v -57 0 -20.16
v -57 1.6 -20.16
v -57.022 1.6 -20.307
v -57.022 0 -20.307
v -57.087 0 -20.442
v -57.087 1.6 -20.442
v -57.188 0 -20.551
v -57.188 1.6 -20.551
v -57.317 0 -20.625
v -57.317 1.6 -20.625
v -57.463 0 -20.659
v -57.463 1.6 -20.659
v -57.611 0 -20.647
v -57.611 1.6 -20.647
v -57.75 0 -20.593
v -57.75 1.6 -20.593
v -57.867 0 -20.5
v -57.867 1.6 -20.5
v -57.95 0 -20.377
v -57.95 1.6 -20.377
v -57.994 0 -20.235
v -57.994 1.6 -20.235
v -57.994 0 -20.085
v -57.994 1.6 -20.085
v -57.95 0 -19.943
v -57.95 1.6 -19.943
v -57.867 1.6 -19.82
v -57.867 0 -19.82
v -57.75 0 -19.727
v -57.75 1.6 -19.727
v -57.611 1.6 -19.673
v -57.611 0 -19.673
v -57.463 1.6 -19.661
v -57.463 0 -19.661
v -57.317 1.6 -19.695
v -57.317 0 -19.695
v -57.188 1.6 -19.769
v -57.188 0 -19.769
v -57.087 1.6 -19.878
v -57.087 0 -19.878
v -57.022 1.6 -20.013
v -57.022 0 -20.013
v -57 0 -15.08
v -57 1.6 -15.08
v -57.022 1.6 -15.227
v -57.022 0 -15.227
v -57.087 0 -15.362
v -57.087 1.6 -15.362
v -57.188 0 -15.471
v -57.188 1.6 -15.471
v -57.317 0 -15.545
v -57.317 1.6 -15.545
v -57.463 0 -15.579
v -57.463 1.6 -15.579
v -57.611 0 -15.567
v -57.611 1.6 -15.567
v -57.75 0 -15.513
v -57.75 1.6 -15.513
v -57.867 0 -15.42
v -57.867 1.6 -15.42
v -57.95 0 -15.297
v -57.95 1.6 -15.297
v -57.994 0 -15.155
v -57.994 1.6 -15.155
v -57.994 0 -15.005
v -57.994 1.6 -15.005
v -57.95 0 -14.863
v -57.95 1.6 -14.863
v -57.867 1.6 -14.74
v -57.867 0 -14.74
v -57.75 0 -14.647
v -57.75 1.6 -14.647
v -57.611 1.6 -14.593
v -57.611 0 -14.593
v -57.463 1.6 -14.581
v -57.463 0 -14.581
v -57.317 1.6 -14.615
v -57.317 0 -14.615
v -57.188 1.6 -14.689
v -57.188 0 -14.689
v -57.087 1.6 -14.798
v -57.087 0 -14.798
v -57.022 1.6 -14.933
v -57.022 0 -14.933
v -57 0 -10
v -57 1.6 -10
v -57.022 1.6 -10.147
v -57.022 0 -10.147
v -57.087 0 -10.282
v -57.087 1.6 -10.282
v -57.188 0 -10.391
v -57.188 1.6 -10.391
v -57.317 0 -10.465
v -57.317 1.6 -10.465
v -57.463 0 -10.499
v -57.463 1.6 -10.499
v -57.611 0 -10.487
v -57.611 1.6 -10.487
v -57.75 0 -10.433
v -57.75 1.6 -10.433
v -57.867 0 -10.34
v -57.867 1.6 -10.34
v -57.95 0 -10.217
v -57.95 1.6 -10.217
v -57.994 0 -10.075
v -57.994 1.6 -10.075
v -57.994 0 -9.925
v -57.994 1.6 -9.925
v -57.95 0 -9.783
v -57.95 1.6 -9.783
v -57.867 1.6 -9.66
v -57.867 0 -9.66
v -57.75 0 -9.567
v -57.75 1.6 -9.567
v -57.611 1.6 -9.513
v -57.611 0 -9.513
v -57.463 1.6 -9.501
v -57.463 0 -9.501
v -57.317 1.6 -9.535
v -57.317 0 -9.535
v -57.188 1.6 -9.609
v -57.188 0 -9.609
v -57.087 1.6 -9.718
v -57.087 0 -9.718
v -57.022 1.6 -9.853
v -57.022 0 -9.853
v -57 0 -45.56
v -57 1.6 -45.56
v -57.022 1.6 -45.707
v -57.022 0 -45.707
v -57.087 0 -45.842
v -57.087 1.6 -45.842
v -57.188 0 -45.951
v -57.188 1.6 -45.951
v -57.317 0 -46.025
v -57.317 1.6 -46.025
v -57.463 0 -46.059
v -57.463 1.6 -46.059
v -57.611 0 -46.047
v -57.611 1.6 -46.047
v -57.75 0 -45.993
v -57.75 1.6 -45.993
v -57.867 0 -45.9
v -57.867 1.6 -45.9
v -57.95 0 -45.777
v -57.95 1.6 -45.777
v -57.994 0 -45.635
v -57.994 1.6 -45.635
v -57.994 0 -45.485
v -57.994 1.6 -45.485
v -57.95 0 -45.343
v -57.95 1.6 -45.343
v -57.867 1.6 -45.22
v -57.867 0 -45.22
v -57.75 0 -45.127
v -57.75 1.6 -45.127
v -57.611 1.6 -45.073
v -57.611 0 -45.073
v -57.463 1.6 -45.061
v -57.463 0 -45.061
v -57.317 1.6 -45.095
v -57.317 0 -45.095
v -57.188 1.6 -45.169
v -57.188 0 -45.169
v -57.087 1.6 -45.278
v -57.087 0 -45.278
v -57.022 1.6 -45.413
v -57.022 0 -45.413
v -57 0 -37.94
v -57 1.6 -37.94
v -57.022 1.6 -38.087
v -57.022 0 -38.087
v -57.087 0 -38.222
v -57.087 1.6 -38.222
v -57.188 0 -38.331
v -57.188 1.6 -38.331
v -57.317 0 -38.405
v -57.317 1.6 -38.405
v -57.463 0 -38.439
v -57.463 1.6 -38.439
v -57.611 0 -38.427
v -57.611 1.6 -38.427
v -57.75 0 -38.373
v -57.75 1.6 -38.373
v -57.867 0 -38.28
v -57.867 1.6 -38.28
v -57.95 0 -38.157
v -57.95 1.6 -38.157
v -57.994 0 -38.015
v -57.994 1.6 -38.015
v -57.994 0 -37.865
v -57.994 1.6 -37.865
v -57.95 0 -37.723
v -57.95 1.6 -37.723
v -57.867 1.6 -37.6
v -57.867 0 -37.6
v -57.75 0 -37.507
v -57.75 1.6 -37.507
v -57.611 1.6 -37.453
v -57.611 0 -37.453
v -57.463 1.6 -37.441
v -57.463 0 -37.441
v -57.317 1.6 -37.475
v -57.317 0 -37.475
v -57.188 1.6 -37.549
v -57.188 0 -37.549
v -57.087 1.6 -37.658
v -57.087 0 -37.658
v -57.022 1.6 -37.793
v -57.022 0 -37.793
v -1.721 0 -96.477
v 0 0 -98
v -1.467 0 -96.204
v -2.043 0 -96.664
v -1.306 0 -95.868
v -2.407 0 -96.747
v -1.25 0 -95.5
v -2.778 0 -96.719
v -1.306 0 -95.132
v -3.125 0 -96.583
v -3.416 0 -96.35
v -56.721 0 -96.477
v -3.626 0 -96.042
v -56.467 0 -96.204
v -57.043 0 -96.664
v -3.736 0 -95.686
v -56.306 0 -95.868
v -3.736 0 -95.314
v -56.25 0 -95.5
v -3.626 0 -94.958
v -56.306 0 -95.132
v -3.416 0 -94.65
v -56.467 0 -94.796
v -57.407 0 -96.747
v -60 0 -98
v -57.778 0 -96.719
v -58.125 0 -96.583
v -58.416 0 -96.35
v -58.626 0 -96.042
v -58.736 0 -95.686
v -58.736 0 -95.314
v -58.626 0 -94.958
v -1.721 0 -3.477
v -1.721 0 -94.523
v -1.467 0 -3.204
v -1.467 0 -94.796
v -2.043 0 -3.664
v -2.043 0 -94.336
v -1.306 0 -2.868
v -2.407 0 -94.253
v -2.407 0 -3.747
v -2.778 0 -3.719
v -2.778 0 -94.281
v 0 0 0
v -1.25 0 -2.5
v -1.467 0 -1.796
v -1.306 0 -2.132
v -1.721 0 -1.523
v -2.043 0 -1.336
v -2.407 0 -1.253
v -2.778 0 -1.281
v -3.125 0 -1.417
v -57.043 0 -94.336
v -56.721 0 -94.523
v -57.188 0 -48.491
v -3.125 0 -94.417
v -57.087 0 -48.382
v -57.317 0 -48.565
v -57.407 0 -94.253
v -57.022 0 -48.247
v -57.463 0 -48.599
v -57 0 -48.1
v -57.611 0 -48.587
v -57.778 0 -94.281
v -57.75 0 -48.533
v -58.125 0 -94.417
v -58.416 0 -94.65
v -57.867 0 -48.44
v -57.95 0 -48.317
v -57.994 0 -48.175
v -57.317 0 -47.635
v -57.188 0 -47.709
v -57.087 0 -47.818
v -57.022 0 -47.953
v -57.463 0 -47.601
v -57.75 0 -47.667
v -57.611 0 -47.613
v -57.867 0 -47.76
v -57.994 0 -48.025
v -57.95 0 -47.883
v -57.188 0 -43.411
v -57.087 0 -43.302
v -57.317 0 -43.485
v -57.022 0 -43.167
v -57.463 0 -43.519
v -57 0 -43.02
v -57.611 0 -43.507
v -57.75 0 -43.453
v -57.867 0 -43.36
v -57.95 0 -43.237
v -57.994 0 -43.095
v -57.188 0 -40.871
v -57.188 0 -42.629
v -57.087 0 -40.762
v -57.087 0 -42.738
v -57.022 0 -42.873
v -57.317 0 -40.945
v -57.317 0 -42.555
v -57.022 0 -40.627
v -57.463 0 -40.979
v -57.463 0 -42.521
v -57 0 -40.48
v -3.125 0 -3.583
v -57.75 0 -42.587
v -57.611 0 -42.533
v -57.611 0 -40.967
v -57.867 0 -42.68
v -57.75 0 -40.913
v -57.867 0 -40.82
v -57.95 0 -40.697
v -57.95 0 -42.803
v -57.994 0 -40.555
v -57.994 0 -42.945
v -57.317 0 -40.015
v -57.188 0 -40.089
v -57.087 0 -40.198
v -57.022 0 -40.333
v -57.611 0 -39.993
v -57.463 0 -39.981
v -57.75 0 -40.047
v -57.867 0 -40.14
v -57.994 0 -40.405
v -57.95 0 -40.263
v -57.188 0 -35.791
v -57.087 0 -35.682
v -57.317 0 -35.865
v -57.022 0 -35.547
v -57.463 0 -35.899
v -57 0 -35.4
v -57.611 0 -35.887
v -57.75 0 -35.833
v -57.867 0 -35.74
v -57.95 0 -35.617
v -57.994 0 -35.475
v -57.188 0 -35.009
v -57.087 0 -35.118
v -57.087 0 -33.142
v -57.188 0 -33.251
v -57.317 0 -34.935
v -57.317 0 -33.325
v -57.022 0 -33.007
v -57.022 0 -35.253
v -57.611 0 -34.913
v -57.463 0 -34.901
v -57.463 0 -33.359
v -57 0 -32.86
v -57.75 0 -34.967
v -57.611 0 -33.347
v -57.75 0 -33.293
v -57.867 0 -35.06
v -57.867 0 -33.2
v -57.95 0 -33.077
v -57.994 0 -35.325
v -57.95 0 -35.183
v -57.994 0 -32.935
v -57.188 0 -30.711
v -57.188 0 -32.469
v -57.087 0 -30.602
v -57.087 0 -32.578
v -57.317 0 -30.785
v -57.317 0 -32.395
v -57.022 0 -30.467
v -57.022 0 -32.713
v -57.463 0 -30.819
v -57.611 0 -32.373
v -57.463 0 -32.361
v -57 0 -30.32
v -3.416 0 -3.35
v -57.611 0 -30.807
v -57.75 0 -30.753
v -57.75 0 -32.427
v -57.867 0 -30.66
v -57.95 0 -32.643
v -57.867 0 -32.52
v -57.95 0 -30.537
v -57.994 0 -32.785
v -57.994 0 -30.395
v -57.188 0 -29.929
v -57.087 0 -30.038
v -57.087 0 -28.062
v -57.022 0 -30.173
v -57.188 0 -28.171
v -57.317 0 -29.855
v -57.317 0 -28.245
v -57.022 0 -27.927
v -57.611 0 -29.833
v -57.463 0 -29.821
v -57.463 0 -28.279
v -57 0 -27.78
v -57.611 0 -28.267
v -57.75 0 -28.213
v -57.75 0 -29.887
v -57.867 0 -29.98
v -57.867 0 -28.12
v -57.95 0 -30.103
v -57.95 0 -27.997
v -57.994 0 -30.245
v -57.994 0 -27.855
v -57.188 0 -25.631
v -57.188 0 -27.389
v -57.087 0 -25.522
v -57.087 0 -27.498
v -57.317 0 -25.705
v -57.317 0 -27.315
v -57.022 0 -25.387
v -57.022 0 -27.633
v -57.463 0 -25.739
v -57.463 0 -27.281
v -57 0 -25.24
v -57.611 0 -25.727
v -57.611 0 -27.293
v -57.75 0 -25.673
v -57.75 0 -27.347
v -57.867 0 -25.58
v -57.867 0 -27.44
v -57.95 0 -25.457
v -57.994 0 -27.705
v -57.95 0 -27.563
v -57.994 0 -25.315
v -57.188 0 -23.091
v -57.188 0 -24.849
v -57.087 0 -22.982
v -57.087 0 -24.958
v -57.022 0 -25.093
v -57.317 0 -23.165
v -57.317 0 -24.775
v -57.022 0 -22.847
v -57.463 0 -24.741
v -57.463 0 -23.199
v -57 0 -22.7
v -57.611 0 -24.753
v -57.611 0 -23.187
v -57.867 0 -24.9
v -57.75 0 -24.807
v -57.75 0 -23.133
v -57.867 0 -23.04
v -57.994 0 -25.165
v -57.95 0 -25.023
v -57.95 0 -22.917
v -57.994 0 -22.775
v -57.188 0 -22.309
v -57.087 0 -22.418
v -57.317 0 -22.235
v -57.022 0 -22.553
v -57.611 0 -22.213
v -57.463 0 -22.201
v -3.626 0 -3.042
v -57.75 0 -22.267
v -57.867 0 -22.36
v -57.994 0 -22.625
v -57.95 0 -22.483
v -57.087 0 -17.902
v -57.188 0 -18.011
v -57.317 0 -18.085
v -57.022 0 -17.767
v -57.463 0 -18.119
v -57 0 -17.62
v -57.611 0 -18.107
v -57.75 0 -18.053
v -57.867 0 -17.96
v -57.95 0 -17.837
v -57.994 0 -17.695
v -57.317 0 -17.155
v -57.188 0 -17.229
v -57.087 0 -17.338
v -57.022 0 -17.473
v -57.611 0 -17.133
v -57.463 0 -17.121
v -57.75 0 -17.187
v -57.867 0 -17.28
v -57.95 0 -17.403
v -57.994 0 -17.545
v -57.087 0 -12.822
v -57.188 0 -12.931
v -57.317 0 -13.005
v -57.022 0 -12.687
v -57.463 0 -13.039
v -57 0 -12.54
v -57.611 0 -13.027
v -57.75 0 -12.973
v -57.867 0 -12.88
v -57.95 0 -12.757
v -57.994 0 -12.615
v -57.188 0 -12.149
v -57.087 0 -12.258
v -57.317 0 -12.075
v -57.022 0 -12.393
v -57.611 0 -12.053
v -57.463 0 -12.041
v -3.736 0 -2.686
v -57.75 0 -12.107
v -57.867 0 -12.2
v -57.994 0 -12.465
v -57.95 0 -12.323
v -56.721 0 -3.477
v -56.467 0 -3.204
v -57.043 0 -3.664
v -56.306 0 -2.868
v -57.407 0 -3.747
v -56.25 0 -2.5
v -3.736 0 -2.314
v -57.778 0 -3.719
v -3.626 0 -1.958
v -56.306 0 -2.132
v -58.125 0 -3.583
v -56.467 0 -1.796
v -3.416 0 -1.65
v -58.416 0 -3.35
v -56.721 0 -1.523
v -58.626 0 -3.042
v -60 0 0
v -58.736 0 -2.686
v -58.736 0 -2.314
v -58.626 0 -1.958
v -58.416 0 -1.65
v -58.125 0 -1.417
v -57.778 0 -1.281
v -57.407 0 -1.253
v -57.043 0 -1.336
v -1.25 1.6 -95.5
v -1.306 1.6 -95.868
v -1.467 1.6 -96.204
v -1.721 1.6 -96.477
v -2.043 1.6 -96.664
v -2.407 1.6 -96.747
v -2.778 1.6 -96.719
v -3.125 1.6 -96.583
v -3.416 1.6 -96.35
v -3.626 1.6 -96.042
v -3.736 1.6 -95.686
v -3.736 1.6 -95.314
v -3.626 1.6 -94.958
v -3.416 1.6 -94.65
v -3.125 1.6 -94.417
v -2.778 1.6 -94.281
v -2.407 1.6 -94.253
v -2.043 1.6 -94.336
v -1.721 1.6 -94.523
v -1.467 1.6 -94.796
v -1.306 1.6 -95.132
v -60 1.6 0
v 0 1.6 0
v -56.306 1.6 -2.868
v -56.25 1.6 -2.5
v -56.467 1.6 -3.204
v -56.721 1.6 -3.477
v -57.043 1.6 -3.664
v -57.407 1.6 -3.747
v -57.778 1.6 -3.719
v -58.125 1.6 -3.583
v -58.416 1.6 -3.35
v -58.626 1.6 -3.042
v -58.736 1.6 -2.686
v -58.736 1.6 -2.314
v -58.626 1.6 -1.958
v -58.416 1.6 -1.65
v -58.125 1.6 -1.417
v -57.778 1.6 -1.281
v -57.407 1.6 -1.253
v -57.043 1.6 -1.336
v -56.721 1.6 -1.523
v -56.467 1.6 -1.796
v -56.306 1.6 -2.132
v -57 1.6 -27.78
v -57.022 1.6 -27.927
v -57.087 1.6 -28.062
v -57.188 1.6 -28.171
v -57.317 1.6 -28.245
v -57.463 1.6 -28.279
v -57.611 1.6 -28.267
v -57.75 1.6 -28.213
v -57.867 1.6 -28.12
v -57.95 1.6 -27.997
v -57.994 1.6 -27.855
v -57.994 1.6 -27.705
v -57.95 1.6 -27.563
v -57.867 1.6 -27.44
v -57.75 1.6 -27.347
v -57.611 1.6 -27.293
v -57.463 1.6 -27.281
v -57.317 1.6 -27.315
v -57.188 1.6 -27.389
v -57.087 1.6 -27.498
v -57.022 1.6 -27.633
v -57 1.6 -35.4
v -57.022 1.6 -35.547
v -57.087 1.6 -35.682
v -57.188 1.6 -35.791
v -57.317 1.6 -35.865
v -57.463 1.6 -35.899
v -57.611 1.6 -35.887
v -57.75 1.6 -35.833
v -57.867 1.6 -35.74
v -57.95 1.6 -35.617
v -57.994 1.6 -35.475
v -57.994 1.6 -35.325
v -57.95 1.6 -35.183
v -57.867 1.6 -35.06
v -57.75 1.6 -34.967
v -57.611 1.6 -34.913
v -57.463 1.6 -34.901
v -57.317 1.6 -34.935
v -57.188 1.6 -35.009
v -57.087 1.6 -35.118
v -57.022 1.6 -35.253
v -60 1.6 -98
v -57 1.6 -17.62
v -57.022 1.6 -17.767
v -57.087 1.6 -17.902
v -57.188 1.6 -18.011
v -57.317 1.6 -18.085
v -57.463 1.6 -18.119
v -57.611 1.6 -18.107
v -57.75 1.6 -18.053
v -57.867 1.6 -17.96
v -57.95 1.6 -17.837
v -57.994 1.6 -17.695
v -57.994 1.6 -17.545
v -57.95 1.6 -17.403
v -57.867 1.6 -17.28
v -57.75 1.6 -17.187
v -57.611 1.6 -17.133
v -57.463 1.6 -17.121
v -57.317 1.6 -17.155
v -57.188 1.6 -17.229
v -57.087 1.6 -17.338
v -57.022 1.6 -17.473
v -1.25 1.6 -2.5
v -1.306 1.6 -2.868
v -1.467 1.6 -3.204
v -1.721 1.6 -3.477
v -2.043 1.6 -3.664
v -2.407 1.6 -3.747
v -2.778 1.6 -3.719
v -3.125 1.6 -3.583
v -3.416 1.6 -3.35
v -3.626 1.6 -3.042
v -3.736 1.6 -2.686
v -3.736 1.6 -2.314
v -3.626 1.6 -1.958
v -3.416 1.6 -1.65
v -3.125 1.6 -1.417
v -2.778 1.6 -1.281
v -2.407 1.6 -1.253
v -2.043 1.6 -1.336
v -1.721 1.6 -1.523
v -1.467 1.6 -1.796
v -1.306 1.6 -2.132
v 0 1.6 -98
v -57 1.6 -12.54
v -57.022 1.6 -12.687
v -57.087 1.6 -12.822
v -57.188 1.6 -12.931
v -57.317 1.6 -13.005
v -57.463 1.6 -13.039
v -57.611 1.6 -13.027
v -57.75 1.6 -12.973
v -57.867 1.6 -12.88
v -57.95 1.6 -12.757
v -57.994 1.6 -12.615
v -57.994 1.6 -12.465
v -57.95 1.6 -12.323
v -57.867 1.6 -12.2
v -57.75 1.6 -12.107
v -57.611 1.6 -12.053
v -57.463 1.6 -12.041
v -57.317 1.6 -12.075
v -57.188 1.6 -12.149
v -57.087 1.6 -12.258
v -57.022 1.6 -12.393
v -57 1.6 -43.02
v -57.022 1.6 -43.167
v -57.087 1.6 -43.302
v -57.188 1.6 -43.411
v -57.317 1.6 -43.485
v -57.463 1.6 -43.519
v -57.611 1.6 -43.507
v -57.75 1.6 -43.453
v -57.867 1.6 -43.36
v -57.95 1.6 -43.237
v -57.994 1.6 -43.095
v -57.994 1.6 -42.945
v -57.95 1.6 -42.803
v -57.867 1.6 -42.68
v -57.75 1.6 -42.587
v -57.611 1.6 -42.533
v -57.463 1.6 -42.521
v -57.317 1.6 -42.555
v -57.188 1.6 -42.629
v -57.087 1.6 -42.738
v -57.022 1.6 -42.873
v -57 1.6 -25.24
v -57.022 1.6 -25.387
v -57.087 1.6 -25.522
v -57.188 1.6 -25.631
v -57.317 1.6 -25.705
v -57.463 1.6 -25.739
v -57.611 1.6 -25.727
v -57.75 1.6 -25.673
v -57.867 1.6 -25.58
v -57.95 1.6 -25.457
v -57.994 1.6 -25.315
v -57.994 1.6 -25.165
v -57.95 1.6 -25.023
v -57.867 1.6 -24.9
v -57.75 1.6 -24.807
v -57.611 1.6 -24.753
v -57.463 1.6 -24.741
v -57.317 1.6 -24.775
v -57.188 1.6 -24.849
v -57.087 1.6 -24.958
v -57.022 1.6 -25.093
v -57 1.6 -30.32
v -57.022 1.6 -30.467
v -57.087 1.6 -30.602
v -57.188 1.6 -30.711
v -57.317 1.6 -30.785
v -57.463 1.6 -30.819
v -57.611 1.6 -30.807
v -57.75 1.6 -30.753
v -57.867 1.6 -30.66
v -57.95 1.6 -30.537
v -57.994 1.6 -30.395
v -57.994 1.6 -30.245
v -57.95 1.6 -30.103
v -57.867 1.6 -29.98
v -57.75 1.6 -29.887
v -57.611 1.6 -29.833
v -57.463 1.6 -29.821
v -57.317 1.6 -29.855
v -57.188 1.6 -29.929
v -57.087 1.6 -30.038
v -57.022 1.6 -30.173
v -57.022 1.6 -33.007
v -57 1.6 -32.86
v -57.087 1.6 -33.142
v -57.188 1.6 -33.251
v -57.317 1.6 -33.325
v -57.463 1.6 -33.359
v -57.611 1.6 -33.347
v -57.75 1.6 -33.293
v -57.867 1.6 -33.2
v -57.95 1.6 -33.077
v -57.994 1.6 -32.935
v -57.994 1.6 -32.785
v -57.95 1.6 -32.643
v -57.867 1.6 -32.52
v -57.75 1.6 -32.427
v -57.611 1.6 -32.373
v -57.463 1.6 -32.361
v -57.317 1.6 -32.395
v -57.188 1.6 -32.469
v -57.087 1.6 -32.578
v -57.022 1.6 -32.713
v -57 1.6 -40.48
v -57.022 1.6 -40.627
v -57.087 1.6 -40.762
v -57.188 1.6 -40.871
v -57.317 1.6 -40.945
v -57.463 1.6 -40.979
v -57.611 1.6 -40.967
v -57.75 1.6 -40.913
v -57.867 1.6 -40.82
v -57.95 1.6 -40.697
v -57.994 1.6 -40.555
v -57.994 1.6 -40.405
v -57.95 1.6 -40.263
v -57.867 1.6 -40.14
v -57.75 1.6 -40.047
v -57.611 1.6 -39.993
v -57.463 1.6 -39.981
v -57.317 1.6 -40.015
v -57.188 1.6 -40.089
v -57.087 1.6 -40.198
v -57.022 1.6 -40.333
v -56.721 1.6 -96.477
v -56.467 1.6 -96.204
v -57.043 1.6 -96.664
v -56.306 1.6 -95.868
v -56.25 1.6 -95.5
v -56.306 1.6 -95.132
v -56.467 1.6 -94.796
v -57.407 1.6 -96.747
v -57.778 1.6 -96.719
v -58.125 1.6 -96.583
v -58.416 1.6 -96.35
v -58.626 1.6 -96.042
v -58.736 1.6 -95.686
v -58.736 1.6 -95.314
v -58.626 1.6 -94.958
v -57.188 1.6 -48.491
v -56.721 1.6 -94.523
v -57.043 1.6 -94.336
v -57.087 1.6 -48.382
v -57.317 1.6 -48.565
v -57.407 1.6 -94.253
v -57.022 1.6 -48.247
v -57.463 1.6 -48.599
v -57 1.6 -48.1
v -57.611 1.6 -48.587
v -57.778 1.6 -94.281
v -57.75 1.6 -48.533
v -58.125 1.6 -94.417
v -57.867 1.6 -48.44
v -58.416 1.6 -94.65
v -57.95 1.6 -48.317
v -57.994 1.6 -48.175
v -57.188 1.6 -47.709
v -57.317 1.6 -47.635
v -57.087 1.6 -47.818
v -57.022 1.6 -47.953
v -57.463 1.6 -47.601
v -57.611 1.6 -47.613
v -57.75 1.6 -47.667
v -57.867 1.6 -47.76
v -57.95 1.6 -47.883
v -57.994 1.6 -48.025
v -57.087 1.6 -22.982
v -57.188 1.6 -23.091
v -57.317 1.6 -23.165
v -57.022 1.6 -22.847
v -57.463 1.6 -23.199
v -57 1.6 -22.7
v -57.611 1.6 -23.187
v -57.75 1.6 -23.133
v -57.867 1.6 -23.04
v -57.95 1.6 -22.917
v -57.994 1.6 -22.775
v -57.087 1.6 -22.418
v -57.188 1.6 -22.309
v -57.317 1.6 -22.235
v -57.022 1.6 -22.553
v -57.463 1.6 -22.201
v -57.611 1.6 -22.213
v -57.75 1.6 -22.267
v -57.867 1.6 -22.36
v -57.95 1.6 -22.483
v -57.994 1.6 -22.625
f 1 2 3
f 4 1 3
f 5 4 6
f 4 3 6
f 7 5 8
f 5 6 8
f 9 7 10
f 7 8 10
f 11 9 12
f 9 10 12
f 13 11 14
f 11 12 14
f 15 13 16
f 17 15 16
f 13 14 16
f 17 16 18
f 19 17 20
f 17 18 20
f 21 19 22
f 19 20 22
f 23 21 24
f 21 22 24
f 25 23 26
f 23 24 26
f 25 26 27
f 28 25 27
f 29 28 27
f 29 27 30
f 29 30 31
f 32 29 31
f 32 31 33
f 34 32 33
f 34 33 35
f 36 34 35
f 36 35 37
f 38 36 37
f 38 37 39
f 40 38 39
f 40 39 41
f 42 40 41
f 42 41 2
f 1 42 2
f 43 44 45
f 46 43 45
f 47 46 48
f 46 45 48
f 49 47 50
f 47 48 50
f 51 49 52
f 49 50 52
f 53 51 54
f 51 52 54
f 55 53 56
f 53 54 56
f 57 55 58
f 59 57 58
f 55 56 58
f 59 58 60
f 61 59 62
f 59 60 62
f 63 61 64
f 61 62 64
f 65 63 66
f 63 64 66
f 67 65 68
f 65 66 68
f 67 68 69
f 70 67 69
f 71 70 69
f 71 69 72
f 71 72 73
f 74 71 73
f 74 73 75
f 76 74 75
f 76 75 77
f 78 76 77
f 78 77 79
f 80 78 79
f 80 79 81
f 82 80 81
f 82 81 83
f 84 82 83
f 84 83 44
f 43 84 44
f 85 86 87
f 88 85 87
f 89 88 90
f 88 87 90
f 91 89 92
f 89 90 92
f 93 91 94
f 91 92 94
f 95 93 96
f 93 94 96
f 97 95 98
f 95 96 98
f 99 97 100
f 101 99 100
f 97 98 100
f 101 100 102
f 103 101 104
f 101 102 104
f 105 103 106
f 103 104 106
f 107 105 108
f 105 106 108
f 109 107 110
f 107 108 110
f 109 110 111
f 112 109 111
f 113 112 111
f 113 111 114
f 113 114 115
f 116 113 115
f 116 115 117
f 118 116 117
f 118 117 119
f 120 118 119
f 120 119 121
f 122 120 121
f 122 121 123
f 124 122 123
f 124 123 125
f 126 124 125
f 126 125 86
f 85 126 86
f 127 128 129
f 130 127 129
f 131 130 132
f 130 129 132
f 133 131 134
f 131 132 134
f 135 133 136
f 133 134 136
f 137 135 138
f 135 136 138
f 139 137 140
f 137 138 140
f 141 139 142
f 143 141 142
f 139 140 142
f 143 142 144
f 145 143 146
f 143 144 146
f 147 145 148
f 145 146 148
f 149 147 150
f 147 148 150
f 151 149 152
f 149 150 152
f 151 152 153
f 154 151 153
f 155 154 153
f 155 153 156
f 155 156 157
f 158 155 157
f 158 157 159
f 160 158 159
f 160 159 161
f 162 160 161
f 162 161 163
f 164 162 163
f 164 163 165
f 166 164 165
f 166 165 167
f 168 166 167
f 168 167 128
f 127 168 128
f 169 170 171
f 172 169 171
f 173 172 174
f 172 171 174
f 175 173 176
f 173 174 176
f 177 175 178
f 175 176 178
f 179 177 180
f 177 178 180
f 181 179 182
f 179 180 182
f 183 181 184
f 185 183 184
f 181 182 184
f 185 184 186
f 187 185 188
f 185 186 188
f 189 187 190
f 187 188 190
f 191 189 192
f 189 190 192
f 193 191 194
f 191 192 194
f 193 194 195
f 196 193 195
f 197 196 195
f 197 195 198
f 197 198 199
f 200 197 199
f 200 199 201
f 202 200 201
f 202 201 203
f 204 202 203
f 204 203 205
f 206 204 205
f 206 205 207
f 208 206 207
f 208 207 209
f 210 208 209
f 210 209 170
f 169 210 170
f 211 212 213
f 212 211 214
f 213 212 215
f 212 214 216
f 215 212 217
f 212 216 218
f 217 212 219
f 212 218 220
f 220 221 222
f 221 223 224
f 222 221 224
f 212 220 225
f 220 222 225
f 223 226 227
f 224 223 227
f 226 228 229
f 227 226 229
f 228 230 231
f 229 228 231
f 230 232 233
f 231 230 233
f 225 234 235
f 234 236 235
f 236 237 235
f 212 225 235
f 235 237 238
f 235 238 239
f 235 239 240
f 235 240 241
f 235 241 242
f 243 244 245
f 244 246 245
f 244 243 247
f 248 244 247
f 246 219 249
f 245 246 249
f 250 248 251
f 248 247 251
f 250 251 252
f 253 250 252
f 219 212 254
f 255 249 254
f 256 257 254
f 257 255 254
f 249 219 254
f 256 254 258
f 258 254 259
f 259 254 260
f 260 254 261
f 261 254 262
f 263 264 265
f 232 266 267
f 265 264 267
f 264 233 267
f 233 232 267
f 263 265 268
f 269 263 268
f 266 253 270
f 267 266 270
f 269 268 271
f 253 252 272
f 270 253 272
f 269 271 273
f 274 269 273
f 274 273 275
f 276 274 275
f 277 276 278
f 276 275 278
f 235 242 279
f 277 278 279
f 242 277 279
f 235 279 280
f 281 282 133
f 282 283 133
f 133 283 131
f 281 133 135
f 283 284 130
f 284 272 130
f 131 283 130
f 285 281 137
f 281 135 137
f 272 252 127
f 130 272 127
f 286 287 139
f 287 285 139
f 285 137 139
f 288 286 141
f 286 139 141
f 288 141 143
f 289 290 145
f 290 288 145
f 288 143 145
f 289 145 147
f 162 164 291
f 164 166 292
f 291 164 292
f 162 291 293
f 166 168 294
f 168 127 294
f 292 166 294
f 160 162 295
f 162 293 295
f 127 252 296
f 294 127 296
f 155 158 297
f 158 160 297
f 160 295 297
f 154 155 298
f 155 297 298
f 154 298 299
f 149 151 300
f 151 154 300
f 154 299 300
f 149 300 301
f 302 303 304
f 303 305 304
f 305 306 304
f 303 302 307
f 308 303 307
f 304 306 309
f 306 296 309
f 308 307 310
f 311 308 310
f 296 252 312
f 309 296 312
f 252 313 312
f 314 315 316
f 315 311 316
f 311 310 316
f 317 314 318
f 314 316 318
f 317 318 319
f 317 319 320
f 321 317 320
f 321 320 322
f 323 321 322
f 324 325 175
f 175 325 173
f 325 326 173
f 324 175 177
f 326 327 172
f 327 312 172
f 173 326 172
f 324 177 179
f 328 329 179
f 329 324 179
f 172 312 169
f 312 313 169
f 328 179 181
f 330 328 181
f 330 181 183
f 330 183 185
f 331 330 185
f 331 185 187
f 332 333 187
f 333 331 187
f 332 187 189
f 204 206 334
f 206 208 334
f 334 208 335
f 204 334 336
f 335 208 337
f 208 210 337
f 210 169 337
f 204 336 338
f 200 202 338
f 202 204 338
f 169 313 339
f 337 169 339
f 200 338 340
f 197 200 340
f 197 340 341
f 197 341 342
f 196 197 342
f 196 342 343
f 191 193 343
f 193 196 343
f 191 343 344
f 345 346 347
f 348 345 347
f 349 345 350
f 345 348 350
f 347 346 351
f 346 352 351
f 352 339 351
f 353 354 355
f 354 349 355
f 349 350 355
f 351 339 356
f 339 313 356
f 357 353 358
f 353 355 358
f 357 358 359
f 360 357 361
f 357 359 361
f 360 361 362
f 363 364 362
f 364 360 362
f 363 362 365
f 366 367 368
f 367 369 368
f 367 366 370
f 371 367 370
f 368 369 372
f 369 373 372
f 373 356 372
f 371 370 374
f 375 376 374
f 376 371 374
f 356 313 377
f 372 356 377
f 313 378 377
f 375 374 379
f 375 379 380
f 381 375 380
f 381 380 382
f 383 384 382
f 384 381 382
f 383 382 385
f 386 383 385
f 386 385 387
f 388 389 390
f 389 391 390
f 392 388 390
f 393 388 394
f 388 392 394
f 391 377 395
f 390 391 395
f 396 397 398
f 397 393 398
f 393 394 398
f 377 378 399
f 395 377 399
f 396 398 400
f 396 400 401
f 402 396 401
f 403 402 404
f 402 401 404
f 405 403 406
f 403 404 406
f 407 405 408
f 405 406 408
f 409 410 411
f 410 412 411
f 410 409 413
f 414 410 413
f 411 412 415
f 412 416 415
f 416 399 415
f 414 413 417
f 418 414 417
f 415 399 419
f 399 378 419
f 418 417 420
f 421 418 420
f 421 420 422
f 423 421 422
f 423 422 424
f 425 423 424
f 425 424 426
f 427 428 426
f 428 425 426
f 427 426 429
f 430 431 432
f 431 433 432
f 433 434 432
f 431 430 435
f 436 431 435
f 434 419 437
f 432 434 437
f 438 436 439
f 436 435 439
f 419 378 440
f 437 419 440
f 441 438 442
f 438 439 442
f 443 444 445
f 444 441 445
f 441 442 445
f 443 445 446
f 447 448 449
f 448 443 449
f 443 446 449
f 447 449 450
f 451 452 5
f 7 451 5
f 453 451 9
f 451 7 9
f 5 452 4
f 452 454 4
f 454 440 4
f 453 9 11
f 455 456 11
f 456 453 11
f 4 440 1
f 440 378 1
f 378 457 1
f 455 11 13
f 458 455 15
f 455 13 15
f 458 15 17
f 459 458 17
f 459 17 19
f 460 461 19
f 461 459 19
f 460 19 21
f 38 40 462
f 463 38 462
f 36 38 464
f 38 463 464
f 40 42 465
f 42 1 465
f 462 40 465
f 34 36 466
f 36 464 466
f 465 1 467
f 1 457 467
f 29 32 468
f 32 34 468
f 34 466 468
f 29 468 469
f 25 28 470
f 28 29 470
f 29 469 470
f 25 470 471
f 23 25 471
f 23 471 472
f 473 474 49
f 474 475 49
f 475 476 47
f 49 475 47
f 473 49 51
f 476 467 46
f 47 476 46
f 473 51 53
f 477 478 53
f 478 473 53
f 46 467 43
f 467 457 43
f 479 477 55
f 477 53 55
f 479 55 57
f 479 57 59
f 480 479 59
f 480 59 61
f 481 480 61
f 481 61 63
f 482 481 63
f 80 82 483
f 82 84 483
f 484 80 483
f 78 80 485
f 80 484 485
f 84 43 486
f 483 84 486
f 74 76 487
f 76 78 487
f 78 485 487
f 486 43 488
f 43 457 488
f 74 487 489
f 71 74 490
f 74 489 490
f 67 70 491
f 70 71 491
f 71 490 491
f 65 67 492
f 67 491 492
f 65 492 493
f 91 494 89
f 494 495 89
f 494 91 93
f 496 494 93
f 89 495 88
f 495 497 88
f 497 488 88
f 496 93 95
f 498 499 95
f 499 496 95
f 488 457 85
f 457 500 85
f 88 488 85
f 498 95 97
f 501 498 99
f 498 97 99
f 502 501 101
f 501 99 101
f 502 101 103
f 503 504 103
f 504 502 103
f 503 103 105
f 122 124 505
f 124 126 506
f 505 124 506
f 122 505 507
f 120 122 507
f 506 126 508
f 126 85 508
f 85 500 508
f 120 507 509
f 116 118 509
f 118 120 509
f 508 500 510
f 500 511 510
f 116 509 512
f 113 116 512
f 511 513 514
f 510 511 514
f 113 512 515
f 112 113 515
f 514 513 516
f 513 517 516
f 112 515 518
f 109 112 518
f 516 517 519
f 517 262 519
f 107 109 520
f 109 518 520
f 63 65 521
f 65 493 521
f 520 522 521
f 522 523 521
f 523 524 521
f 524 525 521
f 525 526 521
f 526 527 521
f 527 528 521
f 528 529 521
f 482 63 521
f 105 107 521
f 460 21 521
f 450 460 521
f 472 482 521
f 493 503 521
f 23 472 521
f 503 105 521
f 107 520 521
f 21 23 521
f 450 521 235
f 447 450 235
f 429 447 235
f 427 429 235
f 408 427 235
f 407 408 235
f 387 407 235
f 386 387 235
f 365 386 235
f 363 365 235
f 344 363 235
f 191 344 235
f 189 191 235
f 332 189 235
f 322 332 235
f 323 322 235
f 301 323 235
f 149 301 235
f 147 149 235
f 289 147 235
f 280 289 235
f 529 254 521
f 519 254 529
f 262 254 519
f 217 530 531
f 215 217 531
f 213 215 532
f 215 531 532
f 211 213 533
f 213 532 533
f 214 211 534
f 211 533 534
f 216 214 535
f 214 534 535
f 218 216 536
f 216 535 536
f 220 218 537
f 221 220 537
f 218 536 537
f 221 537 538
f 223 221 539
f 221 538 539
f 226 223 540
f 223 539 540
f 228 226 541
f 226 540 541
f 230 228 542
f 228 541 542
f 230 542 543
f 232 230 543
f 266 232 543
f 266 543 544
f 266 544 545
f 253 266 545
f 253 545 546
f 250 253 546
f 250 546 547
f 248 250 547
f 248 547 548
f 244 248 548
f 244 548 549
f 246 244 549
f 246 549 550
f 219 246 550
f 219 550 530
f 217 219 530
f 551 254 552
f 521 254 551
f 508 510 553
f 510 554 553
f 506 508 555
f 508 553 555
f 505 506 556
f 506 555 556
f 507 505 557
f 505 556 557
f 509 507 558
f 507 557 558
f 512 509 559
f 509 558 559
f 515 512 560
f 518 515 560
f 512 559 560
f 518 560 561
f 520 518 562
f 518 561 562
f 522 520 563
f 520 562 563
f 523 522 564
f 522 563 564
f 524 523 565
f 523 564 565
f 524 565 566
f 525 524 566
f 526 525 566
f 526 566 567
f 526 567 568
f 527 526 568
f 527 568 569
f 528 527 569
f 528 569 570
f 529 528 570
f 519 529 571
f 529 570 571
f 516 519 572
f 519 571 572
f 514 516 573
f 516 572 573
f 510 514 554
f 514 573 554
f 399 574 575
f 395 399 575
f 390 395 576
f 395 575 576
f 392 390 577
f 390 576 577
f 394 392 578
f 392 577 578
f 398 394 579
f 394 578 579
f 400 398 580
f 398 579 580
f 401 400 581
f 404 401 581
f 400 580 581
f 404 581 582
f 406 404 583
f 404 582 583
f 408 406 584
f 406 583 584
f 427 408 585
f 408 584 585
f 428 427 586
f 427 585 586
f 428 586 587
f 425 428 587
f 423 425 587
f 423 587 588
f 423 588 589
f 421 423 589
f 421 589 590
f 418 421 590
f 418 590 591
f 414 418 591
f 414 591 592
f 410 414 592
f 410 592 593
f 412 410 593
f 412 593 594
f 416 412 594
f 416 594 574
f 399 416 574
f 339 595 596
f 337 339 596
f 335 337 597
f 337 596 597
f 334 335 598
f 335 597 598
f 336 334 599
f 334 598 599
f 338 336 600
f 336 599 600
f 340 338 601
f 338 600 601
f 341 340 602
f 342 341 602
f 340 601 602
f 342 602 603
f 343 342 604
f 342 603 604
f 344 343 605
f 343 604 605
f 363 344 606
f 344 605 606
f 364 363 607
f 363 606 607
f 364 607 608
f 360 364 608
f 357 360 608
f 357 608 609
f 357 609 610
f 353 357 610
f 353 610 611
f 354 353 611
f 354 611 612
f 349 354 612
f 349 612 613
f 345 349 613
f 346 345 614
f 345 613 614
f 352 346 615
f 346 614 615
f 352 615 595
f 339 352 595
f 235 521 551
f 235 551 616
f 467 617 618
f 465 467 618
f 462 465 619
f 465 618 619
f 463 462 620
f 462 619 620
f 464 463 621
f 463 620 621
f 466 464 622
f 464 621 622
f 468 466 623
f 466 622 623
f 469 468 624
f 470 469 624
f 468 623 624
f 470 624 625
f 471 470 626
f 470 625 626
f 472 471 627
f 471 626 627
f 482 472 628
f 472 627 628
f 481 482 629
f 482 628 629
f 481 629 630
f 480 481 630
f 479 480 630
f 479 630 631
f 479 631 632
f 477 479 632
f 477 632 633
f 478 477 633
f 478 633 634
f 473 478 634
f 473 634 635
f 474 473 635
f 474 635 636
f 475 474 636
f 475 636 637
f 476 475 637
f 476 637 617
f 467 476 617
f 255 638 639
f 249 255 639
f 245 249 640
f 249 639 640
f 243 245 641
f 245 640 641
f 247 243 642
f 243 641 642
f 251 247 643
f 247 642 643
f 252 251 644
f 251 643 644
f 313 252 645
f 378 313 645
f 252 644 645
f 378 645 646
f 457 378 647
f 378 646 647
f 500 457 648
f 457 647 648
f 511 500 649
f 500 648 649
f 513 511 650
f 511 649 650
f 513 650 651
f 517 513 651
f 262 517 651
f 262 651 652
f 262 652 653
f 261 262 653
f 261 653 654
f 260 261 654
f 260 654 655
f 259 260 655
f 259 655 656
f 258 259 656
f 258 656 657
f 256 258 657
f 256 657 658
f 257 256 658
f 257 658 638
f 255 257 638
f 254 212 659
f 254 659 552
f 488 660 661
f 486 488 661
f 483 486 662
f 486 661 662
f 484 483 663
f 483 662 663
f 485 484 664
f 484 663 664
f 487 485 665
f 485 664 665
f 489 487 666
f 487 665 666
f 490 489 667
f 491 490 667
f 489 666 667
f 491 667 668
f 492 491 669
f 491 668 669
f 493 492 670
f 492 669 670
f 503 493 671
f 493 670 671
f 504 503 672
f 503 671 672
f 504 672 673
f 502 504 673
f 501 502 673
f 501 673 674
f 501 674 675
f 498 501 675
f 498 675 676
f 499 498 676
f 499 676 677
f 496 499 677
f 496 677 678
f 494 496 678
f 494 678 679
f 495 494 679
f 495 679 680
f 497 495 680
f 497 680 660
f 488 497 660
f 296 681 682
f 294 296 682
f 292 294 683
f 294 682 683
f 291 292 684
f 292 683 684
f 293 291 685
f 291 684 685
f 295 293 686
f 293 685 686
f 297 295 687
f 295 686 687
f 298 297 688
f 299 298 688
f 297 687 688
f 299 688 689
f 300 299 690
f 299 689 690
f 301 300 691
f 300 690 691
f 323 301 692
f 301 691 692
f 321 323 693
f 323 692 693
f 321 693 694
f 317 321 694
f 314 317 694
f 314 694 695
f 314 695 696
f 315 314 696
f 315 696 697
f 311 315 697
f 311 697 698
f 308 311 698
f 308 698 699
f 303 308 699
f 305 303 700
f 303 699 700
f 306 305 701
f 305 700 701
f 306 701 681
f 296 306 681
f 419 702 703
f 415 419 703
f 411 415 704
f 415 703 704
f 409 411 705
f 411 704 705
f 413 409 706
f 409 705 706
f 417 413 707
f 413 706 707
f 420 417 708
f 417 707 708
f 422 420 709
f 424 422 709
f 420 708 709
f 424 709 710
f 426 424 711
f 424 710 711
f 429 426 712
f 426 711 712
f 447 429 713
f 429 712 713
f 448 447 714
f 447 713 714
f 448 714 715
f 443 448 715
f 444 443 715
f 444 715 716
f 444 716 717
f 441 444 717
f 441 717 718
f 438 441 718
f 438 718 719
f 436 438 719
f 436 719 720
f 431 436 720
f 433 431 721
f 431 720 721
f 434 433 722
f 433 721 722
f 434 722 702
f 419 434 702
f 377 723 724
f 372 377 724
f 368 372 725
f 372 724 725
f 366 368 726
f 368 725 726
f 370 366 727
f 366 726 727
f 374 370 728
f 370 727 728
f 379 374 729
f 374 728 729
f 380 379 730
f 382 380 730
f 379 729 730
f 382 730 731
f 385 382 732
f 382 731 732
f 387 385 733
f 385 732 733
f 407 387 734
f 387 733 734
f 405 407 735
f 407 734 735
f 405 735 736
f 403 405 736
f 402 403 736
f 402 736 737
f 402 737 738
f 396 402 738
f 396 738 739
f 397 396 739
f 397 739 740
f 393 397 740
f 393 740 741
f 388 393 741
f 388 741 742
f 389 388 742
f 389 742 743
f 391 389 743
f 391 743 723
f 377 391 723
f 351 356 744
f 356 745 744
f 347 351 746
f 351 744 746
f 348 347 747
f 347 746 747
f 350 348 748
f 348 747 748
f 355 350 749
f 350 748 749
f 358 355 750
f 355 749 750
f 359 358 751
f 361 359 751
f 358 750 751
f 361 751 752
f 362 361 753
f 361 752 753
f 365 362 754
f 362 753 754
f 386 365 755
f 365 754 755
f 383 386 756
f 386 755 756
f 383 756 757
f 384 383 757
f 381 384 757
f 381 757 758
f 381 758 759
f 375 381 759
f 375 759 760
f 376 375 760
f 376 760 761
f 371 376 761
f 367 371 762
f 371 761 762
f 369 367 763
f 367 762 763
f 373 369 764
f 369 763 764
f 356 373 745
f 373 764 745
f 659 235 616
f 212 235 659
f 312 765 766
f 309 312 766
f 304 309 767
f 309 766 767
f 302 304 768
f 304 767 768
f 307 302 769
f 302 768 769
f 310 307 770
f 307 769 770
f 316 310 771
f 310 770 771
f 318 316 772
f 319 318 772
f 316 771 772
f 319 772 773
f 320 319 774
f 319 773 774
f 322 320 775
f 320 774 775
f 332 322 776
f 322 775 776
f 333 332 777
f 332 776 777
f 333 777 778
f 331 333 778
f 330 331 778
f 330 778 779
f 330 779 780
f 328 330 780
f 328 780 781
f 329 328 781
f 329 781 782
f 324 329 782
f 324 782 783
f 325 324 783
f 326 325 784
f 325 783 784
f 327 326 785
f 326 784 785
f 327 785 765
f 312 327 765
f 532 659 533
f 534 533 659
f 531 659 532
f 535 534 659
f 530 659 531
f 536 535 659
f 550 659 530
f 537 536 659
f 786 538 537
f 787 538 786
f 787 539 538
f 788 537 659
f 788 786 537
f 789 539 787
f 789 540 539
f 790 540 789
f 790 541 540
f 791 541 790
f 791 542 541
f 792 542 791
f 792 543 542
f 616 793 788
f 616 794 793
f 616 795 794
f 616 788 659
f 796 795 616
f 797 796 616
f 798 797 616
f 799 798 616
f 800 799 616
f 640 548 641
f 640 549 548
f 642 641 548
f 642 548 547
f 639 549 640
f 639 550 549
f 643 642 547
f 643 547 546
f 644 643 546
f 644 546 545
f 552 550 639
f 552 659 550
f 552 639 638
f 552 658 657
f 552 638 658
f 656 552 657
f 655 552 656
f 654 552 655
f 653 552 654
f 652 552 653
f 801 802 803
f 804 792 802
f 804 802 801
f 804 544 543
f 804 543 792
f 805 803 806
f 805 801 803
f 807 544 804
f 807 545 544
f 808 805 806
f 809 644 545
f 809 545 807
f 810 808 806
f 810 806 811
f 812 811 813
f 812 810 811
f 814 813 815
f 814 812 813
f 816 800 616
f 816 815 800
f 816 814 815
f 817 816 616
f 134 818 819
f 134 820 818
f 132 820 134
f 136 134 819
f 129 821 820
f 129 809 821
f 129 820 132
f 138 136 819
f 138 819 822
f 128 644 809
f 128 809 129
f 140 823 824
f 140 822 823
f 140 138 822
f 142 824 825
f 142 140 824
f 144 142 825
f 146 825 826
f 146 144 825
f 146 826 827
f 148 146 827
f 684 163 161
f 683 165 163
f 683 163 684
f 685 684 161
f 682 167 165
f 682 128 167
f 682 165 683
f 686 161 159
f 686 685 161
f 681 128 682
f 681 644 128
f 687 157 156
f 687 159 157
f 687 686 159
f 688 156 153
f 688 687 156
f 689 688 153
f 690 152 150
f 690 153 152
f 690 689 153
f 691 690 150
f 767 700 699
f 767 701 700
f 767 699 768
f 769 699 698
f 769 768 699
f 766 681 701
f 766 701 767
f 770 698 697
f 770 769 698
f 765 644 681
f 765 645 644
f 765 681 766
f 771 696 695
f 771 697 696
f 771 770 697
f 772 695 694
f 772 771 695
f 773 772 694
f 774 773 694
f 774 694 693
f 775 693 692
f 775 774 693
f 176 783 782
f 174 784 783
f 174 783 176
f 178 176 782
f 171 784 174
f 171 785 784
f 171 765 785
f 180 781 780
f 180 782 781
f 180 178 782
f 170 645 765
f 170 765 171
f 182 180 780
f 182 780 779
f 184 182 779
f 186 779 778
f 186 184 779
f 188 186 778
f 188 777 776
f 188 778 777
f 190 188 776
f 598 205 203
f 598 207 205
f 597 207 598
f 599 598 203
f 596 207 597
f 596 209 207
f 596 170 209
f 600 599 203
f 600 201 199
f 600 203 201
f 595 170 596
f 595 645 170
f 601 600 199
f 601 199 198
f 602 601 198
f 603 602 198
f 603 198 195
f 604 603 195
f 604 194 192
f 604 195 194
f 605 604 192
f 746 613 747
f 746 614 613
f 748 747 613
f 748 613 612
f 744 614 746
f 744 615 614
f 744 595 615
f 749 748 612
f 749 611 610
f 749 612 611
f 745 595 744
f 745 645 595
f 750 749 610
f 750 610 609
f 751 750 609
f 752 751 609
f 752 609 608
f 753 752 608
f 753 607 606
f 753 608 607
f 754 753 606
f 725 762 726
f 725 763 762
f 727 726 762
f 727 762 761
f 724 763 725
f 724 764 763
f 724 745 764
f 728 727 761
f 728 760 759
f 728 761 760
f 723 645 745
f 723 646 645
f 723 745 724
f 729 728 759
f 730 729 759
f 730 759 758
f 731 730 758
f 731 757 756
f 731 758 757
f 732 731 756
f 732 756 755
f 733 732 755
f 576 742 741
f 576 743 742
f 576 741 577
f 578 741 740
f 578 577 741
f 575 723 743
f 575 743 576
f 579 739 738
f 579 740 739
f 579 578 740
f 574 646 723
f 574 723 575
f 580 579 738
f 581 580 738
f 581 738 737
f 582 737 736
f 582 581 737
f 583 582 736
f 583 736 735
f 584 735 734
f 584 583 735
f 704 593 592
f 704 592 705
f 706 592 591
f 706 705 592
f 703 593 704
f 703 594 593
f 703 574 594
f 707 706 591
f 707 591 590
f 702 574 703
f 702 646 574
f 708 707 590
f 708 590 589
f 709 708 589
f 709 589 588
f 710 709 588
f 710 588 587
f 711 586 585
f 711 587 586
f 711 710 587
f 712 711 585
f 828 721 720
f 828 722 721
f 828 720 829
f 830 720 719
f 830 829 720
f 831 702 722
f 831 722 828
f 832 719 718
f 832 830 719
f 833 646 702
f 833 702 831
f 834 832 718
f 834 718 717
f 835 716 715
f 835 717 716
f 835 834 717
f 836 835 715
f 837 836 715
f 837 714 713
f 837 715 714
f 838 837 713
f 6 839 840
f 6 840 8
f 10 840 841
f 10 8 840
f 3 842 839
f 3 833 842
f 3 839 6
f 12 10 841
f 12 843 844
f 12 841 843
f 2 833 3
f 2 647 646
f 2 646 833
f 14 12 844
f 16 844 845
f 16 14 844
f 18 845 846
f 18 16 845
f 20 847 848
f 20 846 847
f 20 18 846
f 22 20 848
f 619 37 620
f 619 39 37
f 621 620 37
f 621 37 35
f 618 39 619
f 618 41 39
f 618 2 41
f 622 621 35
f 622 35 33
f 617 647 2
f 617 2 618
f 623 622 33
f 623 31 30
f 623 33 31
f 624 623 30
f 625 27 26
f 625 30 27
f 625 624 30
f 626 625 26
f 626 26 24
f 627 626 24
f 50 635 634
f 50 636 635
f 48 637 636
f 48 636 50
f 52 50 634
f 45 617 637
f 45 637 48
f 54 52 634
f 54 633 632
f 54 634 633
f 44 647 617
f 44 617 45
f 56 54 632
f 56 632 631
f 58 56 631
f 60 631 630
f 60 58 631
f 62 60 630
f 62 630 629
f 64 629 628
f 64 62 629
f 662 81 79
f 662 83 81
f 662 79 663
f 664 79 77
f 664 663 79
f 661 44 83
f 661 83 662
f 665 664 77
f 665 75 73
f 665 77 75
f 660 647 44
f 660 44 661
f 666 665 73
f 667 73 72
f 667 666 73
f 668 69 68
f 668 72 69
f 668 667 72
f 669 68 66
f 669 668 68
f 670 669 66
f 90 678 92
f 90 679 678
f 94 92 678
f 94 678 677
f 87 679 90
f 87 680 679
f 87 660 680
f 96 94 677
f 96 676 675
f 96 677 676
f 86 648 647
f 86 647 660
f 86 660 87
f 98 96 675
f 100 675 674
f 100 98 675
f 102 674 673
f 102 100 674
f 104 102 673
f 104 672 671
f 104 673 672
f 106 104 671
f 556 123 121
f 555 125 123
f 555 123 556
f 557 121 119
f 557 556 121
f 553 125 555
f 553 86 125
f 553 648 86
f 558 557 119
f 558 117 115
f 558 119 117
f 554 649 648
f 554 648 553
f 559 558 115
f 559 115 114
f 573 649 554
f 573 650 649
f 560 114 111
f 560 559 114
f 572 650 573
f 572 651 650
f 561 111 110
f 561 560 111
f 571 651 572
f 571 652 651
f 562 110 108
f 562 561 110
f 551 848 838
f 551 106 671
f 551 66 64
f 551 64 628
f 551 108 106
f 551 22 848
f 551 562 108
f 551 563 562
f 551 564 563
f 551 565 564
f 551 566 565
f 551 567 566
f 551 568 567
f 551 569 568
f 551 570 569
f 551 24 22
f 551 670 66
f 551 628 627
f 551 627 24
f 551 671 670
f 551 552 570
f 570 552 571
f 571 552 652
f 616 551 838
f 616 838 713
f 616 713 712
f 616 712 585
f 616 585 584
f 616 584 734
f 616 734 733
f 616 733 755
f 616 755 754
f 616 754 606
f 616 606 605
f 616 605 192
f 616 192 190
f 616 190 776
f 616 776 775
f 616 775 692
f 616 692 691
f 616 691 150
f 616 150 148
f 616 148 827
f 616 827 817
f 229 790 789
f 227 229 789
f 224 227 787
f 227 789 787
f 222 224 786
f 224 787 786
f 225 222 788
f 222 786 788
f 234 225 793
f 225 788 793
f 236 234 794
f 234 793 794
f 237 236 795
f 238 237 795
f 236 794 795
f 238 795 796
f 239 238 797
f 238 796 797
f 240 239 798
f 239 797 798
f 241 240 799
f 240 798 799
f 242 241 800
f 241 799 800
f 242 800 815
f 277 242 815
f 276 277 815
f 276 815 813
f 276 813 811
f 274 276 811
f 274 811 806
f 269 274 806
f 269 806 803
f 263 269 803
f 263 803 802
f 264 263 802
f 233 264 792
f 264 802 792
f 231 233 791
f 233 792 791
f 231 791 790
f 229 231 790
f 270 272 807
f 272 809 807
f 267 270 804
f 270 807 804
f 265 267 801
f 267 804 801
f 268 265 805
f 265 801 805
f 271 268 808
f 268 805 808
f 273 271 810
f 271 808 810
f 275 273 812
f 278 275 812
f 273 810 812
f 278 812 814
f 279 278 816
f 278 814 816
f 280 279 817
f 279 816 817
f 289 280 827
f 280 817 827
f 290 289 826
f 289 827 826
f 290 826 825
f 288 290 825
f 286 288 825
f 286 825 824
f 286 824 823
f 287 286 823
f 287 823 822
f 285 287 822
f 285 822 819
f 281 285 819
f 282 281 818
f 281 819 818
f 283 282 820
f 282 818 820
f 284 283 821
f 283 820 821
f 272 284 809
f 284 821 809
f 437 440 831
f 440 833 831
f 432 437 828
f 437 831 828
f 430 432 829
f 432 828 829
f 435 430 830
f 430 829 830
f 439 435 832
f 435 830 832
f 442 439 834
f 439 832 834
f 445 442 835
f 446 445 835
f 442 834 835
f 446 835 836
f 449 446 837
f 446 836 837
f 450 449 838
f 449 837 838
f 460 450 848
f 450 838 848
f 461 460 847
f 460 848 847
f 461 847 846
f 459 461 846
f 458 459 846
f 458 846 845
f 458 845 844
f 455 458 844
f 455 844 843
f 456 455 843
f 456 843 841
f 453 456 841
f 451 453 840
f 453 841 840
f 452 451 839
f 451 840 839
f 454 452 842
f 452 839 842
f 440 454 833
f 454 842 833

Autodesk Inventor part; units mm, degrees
ref_plane "YZ Plane" through (0, 0, 0) normal (1, 0, 0) x (0, 1, 0)
ref_plane "XZ Plane" through (0, 0, 0) normal (0, 1, 0) x (-1, 0, 0)
ref_plane "XY Plane" through (0, 0, 0) normal (0, 0, 1) x (1, 0, 0)
sketch "PCB" plane through (0, 0, 0) normal (0, 1, 0) x (-1, 0, 0)
  line L0 (0, 0) -> (60, 0)
  line L1 (60, 0) -> (60, -98)
  line L2 (60, -98) -> (0, -98)
  line L3 (0, -98) -> (0, 0)
  dimension "d0" = 98
  dimension "d1" = 60
extrude "PCB_Extr" add sketch "PCB" along normal blind 1.6
sketch "Mounting" plane through (0, 1.6, 0) normal (0, 1, 0) x (1, 0, 0)
  circle A0 centre (-57.5, 2.5) radius 1.25
  circle A1 centre (-57.5, 95.5) radius 1.25
  circle A2 centre (-2.5, 95.5) radius 1.25
  circle A3 centre (-2.5, 2.5) radius 1.25
  line L0 (-60, 0) -> (0, 0) projected
  line L1 (-60, 98) -> (-60, 0) projected
  line L2 (0, 98) -> (-60, 98) projected
  line L3 (0, 0) -> (0, 98) projected
  dimension "d4" = 2.5
  dimension "d5" = 2.5
  dimension "d6" = 2.5
  dimension "d7" = 2.5
  dimension "d8" = 2.5
  dimension "d9" = 2.5
  dimension "d10" = 2.5
  dimension "d11" = 2.5
  dimension "d12" = 2.5
  dimension "d13" = 2.5
  dimension "d14" = 2.5
  dimension "d15" = 2.5
extrude "Mounting_Extr" cut sketch "Mounting" against normal through all contours A0 | A1 | A2 | A3
sketch "Pinning" plane through (0, 1.6, 0) normal (0, 1, 0) x (1, 0, 0)
  circle A0 centre (-57.5, 10) radius 0.5
  circle A1 centre (-57.5, 12.54) radius 0.5
  circle A2 centre (-57.5, 15.08) radius 0.5
  circle A3 centre (-57.5, 25.24) radius 0.5
  circle A4 centre (-57.5, 20.16) radius 0.5
  circle A5 centre (-57.5, 27.78) radius 0.5
  circle A6 centre (-57.5, 22.7) radius 0.5
  circle A7 centre (-57.5, 17.62) radius 0.5
  line L0 (-60, 0) -> (0, 0) projected
  line L1 (-60, 98) -> (-60, 0) projected
  line L2 (-59.0965, 29.05) -> (-55.5485, 29.05)
  circle A8 centre (-57.5, 48.1) radius 0.5
  circle A9 centre (-57.5, 45.56) radius 0.5
  circle A10 centre (-57.5, 43.02) radius 0.5
  circle A11 centre (-57.5, 32.86) radius 0.5
  circle A12 centre (-57.5, 37.94) radius 0.5
  circle A13 centre (-57.5, 30.32) radius 0.5
  circle A14 centre (-57.5, 35.4) radius 0.5
  circle A15 centre (-57.5, 40.48) radius 0.5
  dimension "d18" = 1
  dimension "d19" = 1
  dimension "d20" = 1
  dimension "d21" = 1
  dimension "d22" = 1
  dimension "d23" = 1
  dimension "d24" = 1
  dimension "d25" = 1
  dimension "d26" = 10
  dimension "d27" = 2.5
  dimension "d28" = 2.54
  dimension "d29" = 2.54
  dimension "d30" = 2.54
  dimension "d31" = 2.54
  dimension "d32" = 2.54
  dimension "d33" = 2.54
  dimension "d34" = 2.54
  dimension "d38" = 1.27
extrude "Pinning_Extr" cut sketch "Pinning" against normal through all
equation "\"d5\" = d4"
equation "\"d6\" = d4"
equation "\"d7\" = d4"
equation "\"d9\" = d8"
equation "\"d10\" = d8"
equation "\"d11\" = d8"
equation "\"d12\" = d8"
equation "\"d13\" = d8"
equation "\"d14\" = d8"
equation "\"d15\" = d8"
equation "\"d19\" = d18"
equation "\"d20\" = d18"
equation "\"d21\" = d18"
equation "\"d22\" = d18"
equation "\"d23\" = d18"
equation "\"d24\" = d18"
equation "\"d25\" = d18"
equation "\"d29\" = d28"
equation "\"d30\" = d28"
equation "\"d31\" = d28"
equation "\"d32\" = d28"
equation "\"d33\" = d28"
equation "\"d34\" = d28"
properties part number "Mounting_PCB"
